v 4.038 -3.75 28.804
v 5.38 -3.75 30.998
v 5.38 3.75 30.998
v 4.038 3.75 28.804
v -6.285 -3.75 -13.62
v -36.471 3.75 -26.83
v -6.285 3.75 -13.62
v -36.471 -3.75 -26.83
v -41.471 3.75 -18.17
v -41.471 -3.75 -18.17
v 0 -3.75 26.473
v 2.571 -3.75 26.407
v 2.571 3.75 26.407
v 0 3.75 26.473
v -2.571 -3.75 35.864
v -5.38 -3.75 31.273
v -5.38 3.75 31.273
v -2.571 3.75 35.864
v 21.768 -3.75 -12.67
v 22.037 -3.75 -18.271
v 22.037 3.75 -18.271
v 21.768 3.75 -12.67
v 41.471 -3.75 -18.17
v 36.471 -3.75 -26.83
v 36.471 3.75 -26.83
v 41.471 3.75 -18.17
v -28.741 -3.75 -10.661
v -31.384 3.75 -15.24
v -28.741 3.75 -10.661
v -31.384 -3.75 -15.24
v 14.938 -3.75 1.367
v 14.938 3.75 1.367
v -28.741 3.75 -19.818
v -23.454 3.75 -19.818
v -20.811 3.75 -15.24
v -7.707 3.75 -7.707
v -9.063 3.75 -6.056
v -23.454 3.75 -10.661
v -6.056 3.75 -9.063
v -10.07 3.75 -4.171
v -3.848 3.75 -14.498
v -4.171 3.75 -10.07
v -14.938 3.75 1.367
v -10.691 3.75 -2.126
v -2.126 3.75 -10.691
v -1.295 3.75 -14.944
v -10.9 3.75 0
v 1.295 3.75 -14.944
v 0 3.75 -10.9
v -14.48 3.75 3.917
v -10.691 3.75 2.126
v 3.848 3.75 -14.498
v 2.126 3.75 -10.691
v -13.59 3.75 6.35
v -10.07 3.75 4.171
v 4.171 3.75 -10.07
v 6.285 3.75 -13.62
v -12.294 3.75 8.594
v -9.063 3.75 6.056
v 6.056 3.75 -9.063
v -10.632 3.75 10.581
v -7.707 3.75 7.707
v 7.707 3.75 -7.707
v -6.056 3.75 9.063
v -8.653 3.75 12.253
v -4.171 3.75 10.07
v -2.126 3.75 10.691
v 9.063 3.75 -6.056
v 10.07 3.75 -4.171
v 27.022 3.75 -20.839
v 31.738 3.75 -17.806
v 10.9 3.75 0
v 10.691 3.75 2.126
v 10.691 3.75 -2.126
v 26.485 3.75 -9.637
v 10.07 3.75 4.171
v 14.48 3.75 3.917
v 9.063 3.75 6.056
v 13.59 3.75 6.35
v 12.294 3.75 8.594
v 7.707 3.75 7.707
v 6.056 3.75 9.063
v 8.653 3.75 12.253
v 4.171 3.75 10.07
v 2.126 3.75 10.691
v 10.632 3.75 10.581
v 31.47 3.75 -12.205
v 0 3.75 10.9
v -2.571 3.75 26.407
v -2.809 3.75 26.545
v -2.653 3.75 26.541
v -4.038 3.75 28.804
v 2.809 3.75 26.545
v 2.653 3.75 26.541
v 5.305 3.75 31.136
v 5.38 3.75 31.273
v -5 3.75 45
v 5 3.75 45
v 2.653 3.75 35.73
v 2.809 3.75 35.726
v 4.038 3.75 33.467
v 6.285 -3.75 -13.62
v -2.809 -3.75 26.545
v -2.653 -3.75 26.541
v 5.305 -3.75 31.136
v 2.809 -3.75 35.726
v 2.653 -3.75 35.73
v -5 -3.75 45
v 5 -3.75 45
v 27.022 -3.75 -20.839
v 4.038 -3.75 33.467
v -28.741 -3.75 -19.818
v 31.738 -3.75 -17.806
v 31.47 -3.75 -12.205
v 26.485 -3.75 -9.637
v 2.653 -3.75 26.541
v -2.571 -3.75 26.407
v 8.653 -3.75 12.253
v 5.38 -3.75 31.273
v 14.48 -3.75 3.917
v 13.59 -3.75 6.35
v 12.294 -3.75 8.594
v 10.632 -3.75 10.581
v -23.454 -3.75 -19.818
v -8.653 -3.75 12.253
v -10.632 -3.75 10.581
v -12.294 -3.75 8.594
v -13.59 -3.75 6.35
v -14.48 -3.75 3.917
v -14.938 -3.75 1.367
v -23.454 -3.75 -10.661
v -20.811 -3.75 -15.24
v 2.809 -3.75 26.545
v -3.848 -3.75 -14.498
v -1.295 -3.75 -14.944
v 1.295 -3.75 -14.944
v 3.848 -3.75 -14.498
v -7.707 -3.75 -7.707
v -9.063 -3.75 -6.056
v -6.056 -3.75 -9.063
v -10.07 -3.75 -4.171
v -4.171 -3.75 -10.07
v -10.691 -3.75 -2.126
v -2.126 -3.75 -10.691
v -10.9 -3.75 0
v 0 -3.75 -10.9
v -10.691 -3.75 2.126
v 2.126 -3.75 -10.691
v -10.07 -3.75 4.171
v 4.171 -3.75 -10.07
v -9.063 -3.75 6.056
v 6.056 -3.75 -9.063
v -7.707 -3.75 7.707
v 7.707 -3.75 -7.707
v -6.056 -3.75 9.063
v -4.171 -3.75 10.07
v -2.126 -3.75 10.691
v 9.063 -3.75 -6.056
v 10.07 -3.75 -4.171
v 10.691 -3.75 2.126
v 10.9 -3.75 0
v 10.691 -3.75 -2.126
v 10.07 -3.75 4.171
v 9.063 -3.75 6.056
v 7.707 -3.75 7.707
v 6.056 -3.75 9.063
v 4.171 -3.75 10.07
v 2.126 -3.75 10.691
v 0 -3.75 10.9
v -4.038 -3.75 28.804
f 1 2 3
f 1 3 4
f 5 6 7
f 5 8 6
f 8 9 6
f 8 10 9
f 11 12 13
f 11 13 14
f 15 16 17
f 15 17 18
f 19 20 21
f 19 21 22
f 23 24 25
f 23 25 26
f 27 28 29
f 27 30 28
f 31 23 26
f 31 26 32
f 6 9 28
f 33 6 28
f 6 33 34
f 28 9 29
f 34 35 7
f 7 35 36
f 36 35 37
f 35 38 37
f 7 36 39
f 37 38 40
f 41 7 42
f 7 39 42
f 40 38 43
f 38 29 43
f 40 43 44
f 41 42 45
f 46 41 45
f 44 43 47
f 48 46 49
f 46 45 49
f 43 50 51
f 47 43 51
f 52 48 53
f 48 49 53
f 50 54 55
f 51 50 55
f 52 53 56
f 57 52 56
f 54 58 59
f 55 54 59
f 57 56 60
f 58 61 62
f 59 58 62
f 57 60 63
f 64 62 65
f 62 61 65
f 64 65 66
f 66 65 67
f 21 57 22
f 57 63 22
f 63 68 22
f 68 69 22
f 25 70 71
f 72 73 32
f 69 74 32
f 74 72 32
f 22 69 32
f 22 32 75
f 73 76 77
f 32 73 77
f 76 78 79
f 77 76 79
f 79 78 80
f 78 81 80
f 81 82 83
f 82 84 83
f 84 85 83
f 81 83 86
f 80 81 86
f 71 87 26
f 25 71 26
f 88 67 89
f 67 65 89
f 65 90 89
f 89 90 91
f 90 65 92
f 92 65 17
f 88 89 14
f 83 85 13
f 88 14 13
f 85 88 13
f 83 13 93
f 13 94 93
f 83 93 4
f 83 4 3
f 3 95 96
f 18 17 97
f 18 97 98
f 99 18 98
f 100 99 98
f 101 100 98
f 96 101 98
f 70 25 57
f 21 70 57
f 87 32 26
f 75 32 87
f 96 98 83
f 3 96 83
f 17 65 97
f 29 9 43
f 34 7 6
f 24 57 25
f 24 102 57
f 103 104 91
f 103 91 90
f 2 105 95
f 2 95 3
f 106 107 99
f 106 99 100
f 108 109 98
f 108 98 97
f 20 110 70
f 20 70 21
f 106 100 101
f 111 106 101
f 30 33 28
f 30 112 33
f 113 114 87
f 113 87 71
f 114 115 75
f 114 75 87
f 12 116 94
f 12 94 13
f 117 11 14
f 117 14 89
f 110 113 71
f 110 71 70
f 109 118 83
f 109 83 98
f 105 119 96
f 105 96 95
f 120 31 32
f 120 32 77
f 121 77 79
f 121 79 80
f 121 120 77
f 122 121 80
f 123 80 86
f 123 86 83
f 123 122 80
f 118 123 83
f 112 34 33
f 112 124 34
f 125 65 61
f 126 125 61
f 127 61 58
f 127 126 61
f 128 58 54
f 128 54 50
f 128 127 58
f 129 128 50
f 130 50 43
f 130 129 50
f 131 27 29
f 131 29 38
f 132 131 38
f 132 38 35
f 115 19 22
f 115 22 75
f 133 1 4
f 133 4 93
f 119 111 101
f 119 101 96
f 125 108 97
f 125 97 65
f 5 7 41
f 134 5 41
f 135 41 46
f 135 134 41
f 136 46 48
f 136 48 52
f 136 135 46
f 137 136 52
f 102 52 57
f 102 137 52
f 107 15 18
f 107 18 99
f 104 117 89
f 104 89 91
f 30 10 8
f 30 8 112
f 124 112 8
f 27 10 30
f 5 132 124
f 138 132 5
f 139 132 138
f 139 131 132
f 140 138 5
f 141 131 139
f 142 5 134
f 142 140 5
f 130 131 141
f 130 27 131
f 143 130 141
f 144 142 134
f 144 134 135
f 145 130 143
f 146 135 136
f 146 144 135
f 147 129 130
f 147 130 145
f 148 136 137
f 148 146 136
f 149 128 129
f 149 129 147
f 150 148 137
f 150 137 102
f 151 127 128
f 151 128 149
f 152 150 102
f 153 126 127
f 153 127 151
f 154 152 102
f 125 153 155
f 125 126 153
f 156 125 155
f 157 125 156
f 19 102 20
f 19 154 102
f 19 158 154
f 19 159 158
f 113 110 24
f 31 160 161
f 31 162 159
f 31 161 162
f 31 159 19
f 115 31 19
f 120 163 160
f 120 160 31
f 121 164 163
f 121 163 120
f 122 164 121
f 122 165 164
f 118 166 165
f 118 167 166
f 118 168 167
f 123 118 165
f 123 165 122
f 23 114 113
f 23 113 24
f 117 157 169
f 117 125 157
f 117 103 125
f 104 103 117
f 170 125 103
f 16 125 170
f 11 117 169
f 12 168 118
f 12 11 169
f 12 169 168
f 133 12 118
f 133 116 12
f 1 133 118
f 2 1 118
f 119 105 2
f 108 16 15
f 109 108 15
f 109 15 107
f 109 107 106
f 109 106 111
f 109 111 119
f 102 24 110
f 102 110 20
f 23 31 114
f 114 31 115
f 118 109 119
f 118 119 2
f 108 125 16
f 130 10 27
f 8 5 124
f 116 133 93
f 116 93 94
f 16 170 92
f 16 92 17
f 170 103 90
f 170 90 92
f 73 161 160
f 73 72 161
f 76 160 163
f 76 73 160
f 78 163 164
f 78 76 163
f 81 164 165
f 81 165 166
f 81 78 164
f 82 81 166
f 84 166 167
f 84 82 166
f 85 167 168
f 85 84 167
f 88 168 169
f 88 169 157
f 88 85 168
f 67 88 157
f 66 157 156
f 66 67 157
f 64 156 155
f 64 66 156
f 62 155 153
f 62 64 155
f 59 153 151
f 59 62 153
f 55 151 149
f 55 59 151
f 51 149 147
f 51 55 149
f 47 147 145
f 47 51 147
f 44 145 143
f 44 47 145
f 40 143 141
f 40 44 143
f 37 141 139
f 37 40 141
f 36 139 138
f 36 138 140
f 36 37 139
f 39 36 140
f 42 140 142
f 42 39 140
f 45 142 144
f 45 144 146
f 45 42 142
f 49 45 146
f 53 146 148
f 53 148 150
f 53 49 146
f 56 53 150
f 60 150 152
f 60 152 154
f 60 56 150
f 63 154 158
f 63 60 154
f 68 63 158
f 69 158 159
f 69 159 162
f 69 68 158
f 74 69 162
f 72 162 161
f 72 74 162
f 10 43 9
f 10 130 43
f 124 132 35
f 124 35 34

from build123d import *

# Parameters (mm, degrees)
F0_R     = 10.9
F1_DEPTH = 3.75


with BuildPart() as f1:
    # F0 (on Front) → F1 (new body, symmetric)
    with BuildSketch(Plane.XZ):
        with BuildLine():
            ThreePointArc((14.937581, 1.366992), (14.984387, 0.684208), (15, 0))
            ThreePointArc((15, 0), (12.634756, -8.084735), (6.284941, -13.619821))
            Line((6.284941, -13.619821), (36.471143, -26.830127))
            Line((36.471143, -26.830127), (38.971143, -22.5))
            Line((38.971143, -22.5), (41.471143, -18.169873))
            Line((41.471143, -18.169873), (14.937581, 1.366992))
        make_face()
        Polygon((31.738434, -17.805939), (27.021887, -20.839044), (22.036867, -18.270946), (21.768395, -12.669745), (26.484942, -9.63664), (31.469961, -12.204737), align=None, mode=Mode.SUBTRACT)
        with BuildLine():
            Line((-36.471143, -26.830127), (-6.284941, -13.619821))
            ThreePointArc((-6.284941, -13.619821), (-12.990381, -7.5), (-14.937581, 1.366992))
            Line((-14.937581, 1.366992), (-41.471143, -18.169873))
            Line((-41.471143, -18.169873), (-38.971143, -22.5))
            Line((-38.971143, -22.5), (-36.471143, -26.830127))
        make_face()
        Polygon((-31.384168, -15.239825), (-28.740776, -10.661338), (-23.453994, -10.661338), (-20.810603, -15.239825), (-23.453994, -19.818313), (-28.740776, -19.818313), align=None, mode=Mode.SUBTRACT)
        with BuildLine():
            ThreePointArc((-8.65264, 12.252829), (0, 15), (8.65264, 12.252829))
            Line((8.65264, 12.252829), (5, 45))
            Line((5, 45), (0, 45))
            Line((0, 45), (-5, 45))
            Line((-5, 45), (-8.65264, 12.252829))
        make_face()
        Polygon((4.037737, 33.466694), (5.380126, 31.273188), (5.305265, 31.135505), (5.380126, 30.997823), (4.037737, 28.804316), (2.8093, 26.54502), (2.652632, 26.541011), (2.570827, 26.407338), (0, 26.473128), (-2.570827, 26.407338), (-2.652632, 26.541011), (-2.8093, 26.54502), (-4.037737, 28.804316), (-5.380126, 31.273188), (-2.570827, 35.863672), (2.652632, 35.729999), (2.8093, 35.72599), align=None, mode=Mode.SUBTRACT)
        Circle(F0_R)
        with BuildLine():
            ThreePointArc((6.284941, -13.619821), (12.634756, -8.084735), (15, 0))
            ThreePointArc((15, 0), (14.984387, 0.684208), (14.937581, 1.366992))
            ThreePointArc((14.937581, 1.366992), (12.990381, 7.5), (8.65264, 12.252829))
            ThreePointArc((8.65264, 12.252829), (0, 15), (-8.65264, 12.252829))
            ThreePointArc((-8.65264, 12.252829), (-12.990381, 7.5), (-14.937581, 1.366992))
            ThreePointArc((-14.937581, 1.366992), (-12.990381, -7.5), (-6.284941, -13.619821))
            ThreePointArc((-6.284941, -13.619821), (0, -15), (6.284941, -13.619821))
        make_face()
        Circle(F0_R, mode=Mode.SUBTRACT)
    extrude(amount=F1_DEPTH, both=True)


solid = f1.part
